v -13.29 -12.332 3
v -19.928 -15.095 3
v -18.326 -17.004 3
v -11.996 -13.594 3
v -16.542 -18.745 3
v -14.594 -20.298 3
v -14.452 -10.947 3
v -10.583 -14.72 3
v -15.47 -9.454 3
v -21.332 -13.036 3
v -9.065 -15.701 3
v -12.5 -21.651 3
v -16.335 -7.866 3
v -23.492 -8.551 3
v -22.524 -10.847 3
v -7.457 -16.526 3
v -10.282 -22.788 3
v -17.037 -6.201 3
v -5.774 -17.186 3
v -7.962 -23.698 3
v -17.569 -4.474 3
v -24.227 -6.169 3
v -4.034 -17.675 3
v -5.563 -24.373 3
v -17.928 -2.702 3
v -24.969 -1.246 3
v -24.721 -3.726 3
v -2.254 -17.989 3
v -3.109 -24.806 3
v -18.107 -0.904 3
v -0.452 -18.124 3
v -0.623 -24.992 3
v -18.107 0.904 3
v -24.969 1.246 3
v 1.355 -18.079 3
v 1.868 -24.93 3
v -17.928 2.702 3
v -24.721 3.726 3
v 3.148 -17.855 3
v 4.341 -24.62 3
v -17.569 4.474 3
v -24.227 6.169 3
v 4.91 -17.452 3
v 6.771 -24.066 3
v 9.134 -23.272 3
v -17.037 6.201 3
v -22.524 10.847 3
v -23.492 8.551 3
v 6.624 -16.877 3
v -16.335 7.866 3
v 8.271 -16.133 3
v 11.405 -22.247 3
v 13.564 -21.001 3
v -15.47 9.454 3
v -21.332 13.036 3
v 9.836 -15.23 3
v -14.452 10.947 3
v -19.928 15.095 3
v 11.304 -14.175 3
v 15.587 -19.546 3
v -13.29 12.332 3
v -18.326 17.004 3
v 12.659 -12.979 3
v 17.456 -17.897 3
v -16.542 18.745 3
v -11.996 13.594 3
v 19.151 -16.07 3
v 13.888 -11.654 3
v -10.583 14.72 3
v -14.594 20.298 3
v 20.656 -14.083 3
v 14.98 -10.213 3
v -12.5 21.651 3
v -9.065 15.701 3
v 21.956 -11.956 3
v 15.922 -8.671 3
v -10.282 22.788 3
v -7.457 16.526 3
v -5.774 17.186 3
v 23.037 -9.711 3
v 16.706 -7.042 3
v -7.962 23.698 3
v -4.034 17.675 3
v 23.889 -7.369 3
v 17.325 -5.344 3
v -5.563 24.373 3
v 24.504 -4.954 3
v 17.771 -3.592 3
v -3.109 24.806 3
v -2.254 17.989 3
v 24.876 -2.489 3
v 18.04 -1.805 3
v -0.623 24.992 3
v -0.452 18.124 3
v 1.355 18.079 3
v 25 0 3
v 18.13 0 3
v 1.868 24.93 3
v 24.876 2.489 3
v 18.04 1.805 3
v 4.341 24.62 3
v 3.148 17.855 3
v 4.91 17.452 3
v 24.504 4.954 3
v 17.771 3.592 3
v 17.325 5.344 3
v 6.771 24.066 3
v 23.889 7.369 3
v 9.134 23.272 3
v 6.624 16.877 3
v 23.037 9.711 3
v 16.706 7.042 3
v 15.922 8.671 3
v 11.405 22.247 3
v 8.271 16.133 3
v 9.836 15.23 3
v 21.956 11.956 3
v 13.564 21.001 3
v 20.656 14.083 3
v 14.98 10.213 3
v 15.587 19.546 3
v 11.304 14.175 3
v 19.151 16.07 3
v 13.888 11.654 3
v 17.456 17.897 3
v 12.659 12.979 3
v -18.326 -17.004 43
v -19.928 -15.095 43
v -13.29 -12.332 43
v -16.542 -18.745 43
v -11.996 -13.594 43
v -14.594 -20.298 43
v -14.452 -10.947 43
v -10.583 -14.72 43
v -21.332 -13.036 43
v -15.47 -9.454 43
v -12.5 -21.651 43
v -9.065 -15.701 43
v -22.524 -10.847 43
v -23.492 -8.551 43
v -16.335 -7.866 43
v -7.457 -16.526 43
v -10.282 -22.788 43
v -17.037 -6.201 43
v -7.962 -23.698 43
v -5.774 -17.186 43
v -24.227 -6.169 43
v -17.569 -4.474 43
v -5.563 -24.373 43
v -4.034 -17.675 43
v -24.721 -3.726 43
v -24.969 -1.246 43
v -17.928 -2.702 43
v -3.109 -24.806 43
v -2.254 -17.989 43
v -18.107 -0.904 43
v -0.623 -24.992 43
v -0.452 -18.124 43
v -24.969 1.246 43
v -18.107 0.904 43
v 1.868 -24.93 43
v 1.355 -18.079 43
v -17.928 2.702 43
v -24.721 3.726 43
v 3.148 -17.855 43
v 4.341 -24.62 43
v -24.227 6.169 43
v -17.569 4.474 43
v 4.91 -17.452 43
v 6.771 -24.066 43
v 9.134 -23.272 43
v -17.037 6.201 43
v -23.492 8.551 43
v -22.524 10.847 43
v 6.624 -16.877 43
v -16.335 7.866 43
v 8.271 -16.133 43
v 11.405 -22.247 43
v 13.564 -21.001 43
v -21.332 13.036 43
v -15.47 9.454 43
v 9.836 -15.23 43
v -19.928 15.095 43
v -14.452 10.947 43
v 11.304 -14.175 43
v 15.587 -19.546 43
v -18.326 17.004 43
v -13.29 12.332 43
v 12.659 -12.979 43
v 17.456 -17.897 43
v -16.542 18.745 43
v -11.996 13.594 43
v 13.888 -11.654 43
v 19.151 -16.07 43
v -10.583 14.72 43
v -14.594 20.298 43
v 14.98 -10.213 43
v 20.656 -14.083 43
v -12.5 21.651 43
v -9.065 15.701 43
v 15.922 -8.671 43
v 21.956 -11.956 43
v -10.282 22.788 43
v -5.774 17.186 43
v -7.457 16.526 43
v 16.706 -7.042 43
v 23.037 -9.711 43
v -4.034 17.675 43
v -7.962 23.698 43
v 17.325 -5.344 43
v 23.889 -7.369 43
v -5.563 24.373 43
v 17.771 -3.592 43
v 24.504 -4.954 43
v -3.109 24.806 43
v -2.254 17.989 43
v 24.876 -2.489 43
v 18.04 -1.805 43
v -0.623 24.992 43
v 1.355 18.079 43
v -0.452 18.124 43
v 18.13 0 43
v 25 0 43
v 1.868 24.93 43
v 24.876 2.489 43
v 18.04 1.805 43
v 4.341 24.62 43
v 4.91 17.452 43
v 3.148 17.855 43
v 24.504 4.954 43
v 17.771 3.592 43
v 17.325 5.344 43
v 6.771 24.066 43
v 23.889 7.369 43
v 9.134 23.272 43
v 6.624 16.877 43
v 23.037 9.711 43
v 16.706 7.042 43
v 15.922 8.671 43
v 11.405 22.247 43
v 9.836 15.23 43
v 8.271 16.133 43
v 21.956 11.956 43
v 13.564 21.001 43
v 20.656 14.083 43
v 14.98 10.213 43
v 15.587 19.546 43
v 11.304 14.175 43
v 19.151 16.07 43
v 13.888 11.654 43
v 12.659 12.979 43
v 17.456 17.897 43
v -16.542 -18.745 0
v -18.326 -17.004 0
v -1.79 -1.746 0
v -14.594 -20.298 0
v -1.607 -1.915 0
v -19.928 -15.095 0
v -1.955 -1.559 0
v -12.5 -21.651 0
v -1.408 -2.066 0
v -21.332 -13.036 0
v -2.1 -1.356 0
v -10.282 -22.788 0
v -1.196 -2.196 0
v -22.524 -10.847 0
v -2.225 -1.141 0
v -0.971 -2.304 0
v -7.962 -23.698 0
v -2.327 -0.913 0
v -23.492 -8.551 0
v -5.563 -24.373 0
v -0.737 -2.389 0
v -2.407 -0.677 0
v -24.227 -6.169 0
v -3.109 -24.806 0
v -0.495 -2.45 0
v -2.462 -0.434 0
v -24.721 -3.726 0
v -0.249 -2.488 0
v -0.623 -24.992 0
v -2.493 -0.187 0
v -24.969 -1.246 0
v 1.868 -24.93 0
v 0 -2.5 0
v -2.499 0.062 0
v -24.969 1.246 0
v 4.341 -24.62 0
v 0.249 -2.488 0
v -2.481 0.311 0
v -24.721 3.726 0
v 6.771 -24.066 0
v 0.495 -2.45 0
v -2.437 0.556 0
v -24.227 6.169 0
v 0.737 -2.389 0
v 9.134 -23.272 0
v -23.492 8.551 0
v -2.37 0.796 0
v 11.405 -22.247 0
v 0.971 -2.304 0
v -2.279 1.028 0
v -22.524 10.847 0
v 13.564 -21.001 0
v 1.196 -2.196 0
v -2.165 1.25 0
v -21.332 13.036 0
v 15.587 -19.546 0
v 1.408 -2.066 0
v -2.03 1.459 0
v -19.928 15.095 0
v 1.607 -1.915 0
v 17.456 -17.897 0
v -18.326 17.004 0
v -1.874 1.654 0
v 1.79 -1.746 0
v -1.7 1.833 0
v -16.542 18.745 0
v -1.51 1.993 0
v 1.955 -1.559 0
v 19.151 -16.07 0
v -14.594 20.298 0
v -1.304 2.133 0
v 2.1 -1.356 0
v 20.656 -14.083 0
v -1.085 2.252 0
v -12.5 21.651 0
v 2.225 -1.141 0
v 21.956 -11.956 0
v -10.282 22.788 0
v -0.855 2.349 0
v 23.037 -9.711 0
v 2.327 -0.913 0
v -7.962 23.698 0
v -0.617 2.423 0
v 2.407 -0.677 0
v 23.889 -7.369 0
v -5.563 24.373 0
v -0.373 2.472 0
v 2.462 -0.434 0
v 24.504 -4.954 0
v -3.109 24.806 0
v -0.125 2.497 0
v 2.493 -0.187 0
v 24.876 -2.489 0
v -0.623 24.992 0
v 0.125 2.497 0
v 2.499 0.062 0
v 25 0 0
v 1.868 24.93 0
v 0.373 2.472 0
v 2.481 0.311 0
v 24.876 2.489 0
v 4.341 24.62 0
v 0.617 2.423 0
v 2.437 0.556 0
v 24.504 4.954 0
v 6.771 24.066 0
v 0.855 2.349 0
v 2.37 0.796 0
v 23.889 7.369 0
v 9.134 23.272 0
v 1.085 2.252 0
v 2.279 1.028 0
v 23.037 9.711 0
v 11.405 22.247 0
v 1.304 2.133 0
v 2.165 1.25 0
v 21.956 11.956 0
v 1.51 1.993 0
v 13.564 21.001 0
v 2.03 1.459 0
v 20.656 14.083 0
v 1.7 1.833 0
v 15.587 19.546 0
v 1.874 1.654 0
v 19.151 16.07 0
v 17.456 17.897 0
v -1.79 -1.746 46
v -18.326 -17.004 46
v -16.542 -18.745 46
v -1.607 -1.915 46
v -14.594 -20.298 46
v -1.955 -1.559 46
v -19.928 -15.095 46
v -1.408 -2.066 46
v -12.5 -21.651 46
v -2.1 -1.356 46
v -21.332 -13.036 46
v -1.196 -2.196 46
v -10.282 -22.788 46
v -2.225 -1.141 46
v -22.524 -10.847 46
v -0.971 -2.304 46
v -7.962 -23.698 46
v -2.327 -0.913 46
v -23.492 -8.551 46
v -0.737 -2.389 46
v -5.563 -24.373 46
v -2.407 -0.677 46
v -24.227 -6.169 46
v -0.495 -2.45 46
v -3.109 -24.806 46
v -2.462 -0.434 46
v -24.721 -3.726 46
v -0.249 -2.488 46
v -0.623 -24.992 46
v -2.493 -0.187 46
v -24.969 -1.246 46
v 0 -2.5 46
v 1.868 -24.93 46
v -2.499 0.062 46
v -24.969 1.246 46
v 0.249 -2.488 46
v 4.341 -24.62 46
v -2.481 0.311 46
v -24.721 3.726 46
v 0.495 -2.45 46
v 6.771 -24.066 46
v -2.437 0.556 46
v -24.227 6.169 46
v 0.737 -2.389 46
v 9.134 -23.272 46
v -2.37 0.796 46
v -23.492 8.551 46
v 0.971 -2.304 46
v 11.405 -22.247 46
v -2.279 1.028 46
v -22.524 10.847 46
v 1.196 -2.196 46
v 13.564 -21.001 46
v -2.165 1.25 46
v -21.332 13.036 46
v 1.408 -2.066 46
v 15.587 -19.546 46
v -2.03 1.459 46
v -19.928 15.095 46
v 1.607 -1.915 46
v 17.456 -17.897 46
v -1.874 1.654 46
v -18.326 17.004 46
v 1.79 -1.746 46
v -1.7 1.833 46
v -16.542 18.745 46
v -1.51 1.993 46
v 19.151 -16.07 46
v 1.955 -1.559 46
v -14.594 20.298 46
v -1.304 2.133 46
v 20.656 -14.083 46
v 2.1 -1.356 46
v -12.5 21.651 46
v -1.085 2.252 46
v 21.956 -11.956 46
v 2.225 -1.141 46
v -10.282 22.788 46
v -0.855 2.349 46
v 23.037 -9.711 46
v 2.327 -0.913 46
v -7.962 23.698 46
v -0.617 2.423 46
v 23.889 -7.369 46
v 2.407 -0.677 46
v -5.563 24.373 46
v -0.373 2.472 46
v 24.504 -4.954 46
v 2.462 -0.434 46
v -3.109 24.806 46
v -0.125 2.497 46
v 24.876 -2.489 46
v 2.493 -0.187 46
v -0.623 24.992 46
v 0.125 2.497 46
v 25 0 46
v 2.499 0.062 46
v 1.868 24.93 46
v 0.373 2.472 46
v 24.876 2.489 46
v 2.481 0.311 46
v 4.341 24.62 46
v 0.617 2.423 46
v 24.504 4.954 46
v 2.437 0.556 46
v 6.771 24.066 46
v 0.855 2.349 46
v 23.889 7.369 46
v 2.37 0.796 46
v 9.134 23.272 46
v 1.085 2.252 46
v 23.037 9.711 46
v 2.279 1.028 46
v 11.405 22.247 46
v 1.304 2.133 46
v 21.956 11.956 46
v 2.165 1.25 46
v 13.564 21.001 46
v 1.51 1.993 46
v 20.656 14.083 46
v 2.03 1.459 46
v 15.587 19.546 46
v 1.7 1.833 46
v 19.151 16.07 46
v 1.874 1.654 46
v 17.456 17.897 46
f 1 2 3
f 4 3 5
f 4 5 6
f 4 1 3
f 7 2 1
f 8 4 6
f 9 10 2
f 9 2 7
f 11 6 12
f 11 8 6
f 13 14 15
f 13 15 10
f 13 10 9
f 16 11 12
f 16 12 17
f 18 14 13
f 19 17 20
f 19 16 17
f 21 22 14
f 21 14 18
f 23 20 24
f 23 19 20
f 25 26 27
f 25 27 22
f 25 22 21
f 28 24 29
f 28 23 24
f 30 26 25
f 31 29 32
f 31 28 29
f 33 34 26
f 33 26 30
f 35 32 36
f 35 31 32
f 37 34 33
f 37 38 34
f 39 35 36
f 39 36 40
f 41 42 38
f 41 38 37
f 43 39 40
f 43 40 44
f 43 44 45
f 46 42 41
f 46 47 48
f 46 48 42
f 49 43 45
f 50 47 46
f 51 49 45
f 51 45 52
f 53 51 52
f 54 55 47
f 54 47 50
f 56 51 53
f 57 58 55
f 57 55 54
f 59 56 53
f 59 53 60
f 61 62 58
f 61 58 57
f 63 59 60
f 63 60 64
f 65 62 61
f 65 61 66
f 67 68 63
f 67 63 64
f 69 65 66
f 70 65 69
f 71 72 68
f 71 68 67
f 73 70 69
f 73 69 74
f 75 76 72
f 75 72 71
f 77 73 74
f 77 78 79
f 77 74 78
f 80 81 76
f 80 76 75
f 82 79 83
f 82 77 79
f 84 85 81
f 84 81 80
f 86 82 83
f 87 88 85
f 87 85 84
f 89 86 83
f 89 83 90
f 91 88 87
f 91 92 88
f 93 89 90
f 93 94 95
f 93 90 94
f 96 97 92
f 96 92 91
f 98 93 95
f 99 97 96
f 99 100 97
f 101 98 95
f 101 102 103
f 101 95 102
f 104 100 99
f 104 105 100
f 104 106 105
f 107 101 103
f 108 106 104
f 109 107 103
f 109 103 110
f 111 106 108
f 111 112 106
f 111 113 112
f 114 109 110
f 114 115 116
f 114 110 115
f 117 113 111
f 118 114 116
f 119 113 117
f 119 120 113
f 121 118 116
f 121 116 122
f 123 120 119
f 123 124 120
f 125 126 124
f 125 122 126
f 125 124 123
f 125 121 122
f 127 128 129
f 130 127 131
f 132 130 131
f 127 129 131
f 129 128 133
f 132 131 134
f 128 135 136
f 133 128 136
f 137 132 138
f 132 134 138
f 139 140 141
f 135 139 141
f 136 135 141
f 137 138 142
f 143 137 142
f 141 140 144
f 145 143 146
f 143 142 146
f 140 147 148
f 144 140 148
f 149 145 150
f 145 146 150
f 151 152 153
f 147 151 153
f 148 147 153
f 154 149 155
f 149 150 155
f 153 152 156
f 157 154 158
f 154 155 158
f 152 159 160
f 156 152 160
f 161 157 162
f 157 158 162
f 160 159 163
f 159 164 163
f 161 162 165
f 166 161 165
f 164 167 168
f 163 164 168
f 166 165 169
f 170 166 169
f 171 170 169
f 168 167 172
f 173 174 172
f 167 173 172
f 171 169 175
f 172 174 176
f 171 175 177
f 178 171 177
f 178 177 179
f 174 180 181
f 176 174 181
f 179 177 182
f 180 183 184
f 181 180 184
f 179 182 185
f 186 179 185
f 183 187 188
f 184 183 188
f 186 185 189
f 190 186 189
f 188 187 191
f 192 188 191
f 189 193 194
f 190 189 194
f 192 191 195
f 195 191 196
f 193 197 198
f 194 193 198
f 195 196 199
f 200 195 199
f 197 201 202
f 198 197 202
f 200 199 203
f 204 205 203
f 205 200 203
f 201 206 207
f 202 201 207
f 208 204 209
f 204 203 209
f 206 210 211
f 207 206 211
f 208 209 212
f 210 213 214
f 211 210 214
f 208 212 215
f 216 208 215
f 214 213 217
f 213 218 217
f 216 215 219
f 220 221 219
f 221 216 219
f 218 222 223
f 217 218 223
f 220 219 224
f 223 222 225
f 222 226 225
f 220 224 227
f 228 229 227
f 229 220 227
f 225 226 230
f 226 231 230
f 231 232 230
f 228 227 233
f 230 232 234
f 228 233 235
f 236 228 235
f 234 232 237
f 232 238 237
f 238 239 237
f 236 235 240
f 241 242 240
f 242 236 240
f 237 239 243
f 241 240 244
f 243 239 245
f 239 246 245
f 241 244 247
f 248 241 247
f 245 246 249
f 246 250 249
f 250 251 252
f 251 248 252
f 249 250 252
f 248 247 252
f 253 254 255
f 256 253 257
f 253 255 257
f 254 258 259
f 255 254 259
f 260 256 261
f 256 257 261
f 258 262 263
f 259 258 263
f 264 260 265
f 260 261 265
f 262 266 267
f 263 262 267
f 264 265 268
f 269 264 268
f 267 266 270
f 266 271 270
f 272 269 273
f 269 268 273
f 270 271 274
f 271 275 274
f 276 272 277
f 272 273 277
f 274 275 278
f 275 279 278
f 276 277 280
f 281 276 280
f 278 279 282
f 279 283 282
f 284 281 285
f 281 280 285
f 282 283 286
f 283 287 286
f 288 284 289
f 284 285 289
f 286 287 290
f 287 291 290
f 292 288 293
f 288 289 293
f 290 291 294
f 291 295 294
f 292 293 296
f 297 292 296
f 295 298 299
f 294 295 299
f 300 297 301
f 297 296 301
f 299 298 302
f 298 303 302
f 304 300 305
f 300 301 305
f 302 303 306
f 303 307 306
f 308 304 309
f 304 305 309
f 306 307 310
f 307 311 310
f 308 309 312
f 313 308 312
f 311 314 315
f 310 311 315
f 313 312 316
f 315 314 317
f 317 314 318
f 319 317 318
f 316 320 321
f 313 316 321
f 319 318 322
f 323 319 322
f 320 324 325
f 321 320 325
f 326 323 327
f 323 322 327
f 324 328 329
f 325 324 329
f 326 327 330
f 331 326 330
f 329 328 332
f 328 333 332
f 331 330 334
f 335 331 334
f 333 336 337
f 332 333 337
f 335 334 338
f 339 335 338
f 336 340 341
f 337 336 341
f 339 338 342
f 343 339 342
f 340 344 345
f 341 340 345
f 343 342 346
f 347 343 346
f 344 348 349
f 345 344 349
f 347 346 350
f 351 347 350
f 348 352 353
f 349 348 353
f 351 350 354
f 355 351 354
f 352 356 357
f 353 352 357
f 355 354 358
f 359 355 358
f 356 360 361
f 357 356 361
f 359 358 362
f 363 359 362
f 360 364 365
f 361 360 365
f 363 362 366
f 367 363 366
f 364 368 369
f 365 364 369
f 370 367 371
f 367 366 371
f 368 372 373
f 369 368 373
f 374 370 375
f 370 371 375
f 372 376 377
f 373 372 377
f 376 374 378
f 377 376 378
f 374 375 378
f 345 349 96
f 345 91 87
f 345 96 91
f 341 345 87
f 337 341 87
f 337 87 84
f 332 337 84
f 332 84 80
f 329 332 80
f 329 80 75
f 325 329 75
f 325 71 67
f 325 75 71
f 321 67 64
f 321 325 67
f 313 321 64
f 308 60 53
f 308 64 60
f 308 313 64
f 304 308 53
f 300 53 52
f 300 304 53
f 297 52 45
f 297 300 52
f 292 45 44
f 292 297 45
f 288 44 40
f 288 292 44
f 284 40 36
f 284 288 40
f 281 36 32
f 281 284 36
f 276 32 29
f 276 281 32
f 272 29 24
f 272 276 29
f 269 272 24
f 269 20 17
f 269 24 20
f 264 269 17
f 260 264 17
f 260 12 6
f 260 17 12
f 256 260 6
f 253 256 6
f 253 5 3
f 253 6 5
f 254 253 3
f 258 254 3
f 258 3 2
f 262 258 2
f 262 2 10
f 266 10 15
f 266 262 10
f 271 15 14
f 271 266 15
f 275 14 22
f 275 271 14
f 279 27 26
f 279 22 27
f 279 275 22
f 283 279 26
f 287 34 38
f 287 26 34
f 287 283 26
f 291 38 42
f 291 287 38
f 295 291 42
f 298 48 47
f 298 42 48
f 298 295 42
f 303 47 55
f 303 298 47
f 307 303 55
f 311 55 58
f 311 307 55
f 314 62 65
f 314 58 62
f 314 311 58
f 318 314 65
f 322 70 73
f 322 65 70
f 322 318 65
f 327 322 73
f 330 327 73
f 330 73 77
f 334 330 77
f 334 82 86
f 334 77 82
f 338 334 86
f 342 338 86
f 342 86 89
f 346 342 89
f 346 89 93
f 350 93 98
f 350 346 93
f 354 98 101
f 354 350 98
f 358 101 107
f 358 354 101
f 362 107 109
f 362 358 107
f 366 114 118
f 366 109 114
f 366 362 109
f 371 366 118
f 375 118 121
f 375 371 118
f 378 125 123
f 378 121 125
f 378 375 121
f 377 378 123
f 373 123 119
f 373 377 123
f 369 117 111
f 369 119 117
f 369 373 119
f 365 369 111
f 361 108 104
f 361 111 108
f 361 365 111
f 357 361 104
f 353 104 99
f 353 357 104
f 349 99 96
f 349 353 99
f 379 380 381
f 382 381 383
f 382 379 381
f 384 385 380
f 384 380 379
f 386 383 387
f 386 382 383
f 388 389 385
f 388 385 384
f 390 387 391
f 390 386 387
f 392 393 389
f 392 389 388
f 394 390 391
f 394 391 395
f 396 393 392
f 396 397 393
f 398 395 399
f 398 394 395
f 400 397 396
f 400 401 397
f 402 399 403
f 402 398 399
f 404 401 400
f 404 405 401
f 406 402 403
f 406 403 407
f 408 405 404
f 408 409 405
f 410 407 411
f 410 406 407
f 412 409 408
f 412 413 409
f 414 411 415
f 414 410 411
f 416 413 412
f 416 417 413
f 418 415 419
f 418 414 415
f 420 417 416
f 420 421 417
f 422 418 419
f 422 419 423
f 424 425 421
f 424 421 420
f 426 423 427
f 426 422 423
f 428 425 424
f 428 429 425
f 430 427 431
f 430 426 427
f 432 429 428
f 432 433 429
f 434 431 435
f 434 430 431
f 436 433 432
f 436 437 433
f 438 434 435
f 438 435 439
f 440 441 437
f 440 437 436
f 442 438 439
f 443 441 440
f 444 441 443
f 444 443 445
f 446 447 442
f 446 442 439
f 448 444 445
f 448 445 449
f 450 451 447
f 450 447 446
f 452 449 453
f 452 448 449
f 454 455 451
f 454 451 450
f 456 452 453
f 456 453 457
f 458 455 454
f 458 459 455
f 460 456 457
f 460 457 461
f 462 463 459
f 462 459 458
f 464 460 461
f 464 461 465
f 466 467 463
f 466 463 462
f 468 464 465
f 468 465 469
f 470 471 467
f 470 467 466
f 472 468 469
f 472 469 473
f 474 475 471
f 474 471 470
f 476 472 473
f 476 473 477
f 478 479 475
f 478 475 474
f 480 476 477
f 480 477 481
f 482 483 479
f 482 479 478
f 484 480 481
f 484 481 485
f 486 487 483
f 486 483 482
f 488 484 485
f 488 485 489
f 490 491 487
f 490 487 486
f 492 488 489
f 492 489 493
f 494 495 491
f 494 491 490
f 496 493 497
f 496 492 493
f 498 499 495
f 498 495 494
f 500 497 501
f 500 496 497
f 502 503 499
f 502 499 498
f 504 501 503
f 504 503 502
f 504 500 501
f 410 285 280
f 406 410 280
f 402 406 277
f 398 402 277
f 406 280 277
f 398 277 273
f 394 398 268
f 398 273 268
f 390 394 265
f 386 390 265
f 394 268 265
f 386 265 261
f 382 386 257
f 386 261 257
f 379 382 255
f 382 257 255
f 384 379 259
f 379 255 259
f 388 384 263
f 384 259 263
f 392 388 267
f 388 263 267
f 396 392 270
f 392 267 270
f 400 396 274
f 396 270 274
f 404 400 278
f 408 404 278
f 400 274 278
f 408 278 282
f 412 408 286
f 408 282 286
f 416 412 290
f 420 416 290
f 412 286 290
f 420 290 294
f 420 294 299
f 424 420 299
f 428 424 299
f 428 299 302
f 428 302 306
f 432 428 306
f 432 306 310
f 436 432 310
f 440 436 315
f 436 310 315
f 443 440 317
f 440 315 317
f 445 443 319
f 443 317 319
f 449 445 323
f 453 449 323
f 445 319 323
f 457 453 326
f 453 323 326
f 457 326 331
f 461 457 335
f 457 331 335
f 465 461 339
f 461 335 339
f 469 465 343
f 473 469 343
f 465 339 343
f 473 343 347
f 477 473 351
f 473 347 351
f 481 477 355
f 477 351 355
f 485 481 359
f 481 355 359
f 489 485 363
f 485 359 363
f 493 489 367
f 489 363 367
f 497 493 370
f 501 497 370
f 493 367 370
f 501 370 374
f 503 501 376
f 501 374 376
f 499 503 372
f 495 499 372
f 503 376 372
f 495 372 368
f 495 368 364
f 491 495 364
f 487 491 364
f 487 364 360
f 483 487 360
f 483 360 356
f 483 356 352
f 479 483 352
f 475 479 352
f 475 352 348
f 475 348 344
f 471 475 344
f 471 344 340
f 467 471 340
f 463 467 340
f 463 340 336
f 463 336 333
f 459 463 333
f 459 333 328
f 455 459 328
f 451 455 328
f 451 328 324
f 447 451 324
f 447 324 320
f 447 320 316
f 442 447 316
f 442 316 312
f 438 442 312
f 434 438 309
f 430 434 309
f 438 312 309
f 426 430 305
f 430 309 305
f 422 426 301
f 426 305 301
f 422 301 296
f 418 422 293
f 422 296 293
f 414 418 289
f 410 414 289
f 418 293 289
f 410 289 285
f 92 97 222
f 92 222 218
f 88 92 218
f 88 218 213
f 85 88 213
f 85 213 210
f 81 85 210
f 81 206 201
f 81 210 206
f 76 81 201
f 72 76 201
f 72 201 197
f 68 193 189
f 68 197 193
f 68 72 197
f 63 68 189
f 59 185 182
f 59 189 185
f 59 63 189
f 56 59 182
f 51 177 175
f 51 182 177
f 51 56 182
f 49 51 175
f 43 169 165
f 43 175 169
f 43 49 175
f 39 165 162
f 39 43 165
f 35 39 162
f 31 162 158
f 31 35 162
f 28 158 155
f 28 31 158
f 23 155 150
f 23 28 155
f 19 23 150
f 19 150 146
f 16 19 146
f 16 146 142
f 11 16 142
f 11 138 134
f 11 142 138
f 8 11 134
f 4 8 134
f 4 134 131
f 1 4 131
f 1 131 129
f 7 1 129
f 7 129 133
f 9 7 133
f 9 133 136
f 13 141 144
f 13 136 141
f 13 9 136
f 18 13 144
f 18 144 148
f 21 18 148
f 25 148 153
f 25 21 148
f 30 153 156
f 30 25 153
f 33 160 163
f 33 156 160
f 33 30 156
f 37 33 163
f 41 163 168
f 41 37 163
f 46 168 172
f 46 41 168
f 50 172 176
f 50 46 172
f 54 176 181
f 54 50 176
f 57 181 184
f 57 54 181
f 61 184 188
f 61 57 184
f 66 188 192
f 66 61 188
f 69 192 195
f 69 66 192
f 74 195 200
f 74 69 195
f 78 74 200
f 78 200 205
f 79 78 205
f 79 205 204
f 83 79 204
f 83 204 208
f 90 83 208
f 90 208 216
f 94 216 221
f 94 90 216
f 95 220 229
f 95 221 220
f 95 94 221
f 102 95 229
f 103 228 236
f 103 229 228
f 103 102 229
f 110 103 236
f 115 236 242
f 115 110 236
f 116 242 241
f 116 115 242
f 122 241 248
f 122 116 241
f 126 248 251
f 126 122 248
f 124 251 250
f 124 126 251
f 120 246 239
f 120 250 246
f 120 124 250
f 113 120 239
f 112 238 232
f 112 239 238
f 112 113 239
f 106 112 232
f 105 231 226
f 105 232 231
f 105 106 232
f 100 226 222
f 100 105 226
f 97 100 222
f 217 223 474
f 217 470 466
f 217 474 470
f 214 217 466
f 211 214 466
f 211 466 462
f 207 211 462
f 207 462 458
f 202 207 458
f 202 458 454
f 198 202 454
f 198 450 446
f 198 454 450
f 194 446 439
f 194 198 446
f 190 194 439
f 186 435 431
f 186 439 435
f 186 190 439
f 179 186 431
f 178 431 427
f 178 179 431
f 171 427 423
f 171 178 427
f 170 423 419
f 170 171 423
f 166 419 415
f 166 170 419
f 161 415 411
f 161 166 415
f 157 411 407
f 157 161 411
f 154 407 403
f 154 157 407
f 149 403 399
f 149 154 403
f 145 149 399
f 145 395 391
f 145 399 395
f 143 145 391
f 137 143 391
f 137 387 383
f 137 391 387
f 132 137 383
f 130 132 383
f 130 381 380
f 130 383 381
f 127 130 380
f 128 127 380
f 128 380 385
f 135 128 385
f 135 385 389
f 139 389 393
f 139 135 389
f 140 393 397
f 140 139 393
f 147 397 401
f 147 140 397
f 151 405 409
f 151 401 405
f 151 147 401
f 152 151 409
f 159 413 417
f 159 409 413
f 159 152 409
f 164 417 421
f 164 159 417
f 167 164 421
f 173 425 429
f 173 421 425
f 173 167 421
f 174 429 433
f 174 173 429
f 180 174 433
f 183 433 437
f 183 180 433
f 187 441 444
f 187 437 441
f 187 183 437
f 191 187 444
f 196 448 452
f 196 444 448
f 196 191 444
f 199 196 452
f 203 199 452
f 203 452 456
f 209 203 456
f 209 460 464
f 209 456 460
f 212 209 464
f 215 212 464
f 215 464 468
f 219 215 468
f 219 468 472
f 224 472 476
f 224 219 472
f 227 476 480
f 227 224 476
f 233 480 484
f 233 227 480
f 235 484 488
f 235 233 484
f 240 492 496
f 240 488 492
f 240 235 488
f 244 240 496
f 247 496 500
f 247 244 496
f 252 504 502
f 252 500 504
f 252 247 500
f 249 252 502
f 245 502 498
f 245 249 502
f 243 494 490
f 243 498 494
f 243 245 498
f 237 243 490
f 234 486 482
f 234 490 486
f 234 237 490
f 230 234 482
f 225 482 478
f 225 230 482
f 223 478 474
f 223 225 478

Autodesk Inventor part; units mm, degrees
ref_plane "YZ Plane" through (0, 0, 0) normal (1, 0, 0) x (0, 1, 0)
ref_plane "XZ Plane" through (0, 0, 0) normal (0, 1, 0) x (-1, 0, 0)
ref_plane "XY Plane" through (0, 0, 0) normal (0, 0, 1) x (1, 0, 0)
sketch "スケッチ1" plane through (0, 0, 0) normal (0, 0, 1) x (1, 0, 0)
  circle A0 centre (0, 0) radius 25
  dimension "d0" = 50
extrude "押し出し1" add sketch "スケッチ1" along normal blind 3
sketch "スケッチ2" plane through (0, 0, 3) normal (0, 0, 1) x (1, 0, 0)
  circle A0 centre (0, 0) radius 18.13
  dimension "d3" = 36.26
extrude "押し出し2" add sketch "スケッチ2" along normal blind 40
sketch "スケッチ3" plane through (0, 0, 43) normal (0, 0, 1) x (1, 0, 0)
  circle A0 centre (0, 0) radius 25
  dimension "d6" = 50
extrude "押し出し3" add sketch "スケッチ3" along normal blind 3
sketch "スケッチ4" plane through (0, 0, 46) normal (0, 0, 1) x (1, 0, 0)
  circle A0 centre (0, 0) radius 2.5
  dimension "d9" = 5
hole "穴1" at (0, 0, 46) direction (0, 0, -1) diameter 5 depth 46
equation "\"BendRadius\" = Thickness"
equation "\"BendReliefWidth\" = Thickness"
equation "\"BendReliefDepth\" = 0.5 * Thickness"
equation "\"CornerReliefSize\" = 4 * Thickness"
equation "\"MinimumRemnant\" = 2 * Thickness"
equation "\"TransitionRadius\" = BendRadius"
equation "\"JacobiRadiusSize\" = BendRadius"
equation "\"GapSize\" = Thickness"
equation "\"Thickness\" = 0.5"
properties part number "nhk12"
